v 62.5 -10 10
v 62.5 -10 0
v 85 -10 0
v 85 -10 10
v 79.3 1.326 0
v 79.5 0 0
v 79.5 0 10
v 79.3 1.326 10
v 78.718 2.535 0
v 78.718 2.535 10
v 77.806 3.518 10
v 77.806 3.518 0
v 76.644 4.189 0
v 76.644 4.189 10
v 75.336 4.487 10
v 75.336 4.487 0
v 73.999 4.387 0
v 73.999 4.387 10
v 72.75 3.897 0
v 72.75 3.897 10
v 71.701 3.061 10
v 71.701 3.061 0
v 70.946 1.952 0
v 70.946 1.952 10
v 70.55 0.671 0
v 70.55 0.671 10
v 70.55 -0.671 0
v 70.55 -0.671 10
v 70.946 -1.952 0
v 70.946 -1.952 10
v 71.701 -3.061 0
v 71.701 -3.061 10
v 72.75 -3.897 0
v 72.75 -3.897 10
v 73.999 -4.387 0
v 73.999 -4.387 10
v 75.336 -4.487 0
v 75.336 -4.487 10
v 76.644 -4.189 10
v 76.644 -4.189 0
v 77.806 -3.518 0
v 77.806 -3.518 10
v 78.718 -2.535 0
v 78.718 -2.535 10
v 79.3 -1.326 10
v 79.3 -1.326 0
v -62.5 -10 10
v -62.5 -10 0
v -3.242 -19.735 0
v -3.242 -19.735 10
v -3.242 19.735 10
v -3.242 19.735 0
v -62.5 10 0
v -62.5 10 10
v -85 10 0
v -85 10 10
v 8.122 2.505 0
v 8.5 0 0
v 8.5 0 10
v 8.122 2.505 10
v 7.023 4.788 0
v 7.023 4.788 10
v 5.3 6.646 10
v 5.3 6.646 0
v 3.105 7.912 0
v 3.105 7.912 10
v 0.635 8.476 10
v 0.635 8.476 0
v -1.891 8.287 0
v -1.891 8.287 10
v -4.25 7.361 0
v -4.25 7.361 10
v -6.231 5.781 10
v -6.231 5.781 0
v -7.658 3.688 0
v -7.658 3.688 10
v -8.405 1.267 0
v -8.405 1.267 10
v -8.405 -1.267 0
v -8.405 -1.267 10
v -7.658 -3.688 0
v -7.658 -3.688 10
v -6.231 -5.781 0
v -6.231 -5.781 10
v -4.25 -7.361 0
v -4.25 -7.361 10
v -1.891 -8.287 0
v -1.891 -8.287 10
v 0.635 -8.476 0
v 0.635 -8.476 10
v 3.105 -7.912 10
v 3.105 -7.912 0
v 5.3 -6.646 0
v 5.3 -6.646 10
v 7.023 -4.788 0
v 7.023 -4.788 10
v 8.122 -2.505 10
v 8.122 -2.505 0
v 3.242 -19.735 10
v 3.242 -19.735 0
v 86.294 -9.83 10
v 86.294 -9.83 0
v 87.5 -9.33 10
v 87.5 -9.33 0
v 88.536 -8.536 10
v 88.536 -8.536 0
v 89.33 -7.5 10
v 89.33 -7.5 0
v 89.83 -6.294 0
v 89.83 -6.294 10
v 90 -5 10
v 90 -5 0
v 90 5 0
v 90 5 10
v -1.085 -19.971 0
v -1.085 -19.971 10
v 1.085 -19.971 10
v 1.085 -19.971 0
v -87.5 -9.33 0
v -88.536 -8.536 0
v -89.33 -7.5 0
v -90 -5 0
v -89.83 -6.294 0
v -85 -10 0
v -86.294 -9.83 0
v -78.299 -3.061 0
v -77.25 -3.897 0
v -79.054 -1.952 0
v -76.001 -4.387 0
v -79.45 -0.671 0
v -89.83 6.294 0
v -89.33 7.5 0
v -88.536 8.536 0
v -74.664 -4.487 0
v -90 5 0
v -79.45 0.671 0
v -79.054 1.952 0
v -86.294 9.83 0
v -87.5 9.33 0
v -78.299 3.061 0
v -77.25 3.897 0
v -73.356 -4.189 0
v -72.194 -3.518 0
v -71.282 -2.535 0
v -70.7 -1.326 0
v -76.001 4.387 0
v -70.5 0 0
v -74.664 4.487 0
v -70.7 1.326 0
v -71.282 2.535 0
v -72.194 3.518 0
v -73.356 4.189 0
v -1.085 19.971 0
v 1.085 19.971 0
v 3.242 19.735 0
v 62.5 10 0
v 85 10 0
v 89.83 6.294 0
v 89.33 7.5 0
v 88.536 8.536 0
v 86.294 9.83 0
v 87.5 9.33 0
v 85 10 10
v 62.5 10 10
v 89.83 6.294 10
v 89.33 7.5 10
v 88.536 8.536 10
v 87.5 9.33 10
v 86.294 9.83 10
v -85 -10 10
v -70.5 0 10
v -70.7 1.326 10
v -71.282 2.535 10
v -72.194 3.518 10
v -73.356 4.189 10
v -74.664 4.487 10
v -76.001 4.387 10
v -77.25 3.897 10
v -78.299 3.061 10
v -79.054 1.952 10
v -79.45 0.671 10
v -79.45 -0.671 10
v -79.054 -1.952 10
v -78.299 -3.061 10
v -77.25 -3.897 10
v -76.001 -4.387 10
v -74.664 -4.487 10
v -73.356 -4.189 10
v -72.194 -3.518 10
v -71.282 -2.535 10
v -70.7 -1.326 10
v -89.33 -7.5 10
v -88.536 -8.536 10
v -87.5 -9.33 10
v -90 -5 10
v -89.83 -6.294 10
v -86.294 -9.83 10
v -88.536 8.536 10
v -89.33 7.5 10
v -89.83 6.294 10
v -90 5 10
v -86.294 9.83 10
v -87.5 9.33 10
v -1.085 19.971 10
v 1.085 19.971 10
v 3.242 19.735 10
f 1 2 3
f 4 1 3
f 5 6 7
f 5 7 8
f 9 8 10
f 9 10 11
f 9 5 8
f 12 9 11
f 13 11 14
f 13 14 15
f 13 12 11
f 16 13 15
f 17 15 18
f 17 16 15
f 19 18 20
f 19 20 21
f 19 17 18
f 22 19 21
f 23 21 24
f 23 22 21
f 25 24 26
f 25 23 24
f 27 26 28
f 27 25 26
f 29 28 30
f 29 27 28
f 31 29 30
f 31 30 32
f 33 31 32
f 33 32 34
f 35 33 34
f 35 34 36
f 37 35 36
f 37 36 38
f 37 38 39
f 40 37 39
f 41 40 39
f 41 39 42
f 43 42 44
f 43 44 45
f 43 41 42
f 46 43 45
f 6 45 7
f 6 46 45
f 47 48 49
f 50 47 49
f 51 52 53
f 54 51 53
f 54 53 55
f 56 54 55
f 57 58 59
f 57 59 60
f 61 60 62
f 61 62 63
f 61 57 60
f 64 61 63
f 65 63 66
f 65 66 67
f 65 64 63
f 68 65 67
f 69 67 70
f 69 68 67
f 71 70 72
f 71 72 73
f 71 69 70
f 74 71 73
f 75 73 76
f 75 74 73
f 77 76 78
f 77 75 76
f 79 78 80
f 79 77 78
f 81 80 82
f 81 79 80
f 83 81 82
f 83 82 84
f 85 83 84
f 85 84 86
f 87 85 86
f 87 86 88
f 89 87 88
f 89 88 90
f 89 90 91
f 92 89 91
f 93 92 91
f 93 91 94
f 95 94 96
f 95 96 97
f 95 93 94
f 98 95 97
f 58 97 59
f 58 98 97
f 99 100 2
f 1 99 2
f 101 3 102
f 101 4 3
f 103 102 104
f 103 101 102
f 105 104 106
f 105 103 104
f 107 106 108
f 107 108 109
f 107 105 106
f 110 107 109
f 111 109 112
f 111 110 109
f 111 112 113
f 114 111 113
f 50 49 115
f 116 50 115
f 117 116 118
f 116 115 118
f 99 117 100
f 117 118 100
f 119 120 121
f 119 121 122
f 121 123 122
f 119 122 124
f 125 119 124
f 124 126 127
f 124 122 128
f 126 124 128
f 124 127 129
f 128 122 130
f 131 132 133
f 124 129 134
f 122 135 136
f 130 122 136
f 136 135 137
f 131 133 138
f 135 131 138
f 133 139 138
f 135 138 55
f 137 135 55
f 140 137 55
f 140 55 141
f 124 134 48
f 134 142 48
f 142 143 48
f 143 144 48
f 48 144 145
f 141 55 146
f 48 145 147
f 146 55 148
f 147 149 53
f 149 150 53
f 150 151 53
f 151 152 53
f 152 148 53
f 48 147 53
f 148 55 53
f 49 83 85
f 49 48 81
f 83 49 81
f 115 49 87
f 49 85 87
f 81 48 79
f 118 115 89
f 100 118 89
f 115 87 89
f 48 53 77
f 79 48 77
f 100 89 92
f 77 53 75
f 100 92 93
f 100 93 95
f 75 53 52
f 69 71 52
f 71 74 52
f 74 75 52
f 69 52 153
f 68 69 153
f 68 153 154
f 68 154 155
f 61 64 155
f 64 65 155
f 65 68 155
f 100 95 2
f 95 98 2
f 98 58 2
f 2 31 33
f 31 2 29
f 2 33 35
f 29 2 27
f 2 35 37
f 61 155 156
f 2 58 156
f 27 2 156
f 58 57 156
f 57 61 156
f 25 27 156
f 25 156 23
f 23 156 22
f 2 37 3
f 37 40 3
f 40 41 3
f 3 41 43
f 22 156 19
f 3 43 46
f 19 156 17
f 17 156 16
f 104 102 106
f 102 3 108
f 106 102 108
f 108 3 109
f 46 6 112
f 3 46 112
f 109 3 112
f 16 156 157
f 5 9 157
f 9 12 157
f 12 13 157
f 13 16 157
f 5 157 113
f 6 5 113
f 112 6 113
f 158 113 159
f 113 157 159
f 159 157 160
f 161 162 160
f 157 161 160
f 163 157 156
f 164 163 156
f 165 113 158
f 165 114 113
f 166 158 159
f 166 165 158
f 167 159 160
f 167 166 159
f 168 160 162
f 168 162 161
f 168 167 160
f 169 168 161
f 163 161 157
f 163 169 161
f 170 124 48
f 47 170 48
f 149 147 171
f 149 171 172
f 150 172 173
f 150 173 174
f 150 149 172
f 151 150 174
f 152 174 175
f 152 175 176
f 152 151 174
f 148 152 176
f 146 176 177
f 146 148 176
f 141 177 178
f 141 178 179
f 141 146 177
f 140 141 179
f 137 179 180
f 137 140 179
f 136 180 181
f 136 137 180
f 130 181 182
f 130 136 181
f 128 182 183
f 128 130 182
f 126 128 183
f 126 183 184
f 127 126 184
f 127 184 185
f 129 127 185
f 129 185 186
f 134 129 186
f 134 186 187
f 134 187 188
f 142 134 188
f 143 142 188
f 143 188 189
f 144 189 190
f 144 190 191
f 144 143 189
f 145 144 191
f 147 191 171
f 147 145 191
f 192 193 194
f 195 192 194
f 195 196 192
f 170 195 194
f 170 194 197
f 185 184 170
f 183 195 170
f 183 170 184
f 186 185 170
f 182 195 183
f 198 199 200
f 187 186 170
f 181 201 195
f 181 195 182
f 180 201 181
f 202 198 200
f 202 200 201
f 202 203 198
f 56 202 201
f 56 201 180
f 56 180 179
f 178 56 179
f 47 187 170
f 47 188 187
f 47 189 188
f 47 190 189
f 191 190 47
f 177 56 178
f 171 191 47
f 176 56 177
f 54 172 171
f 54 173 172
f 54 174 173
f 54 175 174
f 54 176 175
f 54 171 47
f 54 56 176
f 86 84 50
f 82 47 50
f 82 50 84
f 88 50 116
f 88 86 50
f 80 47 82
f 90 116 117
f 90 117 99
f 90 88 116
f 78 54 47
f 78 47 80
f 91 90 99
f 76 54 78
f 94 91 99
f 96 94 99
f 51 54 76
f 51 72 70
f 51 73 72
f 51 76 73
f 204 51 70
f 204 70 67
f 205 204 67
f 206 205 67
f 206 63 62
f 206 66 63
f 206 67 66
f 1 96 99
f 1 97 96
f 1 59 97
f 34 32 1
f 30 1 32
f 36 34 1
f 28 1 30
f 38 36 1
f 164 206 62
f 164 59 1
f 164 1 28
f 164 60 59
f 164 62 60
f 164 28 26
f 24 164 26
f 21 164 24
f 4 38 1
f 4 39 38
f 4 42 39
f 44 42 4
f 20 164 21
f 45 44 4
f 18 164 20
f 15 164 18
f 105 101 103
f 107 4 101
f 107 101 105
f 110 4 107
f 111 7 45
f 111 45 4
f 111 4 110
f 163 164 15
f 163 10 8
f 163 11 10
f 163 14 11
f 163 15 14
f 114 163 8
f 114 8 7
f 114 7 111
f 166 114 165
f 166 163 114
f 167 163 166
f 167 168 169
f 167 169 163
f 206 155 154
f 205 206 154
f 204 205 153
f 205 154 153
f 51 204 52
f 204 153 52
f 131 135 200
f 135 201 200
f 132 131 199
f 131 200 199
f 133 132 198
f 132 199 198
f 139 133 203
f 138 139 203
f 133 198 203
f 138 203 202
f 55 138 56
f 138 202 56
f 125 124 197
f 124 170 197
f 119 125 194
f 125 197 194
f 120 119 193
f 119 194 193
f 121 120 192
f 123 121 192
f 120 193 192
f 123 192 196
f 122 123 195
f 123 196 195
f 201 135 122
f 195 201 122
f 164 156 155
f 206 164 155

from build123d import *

# Parameters (mm, degrees)
F0_R     = 4.5
F0_R_2   = 8.5
F1_DEPTH = 10
F2_R     = 5


with BuildPart() as f1:
    # F0 (on Top) → F1 (new body)
    with BuildSketch(Plane.XY):
        with BuildLine():
            Line((-62.5, 10), (-90, 10))
            Line((-90, 10), (-90, -10))
            Line((-90, -10), (-62.5, -10))
            Line((-62.5, -10), (-17.320508, -10))
            ThreePointArc((-17.320508, -10), (-20, 0), (-17.320508, 10))
            Line((-17.320508, 10), (-62.5, 10))
        make_face()
        with Locations((-75, 0)):
            Circle(F0_R, mode=Mode.SUBTRACT)
        with BuildLine():
            Line((-3.242331, 19.735432), (-62.5, 10))
            Line((-62.5, 10), (-17.320508, 10))
            ThreePointArc((-17.320508, 10), (-11.375511, 16.449856), (-3.242331, 19.735432))
        make_face()
        with BuildLine():
            ThreePointArc((-3.242331, 19.735432), (-11.375511, 16.449856), (-17.320508, 10))
            Line((-17.320508, 10), (17.320508, 10))
            ThreePointArc((17.320508, 10), (11.375511, 16.449856), (3.242331, 19.735432))
            ThreePointArc((3.242331, 19.735432), (0, 20), (-3.242331, 19.735432))
        make_face()
        with BuildLine():
            Line((-17.320508, -10), (-62.5, -10))
            Line((-62.5, -10), (-3.242331, -19.735432))
            ThreePointArc((-3.242331, -19.735432), (-11.375511, -16.449856), (-17.320508, -10))
        make_face()
        with BuildLine():
            ThreePointArc((3.242331, 19.735432), (11.375511, 16.449856), (17.320508, 10))
            Line((17.320508, 10), (62.5, 10))
            Line((62.5, 10), (3.242331, 19.735432))
        make_face()
        with BuildLine():
            Line((62.5, 10), (17.320508, 10))
            ThreePointArc((17.320508, 10), (19.318517, 5.176381), (20, 0))
            ThreePointArc((20, 0), (19.318517, -5.176381), (17.320508, -10))
            Line((17.320508, -10), (62.5, -10))
            Line((62.5, -10), (90, -10))
            Line((90, -10), (90, 10))
            Line((90, 10), (62.5, 10))
        make_face()
        with Locations((75, 0)):
            Circle(F0_R, mode=Mode.SUBTRACT)
        with BuildLine():
            Line((17.320508, -10), (-17.320508, -10))
            ThreePointArc((-17.320508, -10), (-11.375511, -16.449856), (-3.242331, -19.735432))
            ThreePointArc((-3.242331, -19.735432), (0, -20), (3.242331, -19.735432))
            ThreePointArc((3.242331, -19.735432), (11.375511, -16.449856), (17.320508, -10))
        make_face()
        with BuildLine():
            Line((62.5, -10), (17.320508, -10))
            ThreePointArc((17.320508, -10), (11.375511, -16.449856), (3.242331, -19.735432))
            Line((3.242331, -19.735432), (62.5, -10))
        make_face()
        with BuildLine():
            Line((17.320508, 10), (-17.320508, 10))
            ThreePointArc((-17.320508, 10), (-20, 0), (-17.320508, -10))
            Line((-17.320508, -10), (17.320508, -10))
            ThreePointArc((17.320508, -10), (19.318517, -5.176381), (20, 0))
            ThreePointArc((20, 0), (19.318517, 5.176381), (17.320508, 10))
        make_face()
        Circle(F0_R_2, mode=Mode.SUBTRACT)
    extrude(amount=F1_DEPTH)

    # F2
    f2_edges = [f1.edges().sort_by_distance(p)[0] for p in [
        (-90, -10, 5),
        (-90, 10, 5),
        (90, -10, 5),
        (90, 10, 5),
    ]]
    fillet(f2_edges, radius=F2_R)


solid = f1.part
